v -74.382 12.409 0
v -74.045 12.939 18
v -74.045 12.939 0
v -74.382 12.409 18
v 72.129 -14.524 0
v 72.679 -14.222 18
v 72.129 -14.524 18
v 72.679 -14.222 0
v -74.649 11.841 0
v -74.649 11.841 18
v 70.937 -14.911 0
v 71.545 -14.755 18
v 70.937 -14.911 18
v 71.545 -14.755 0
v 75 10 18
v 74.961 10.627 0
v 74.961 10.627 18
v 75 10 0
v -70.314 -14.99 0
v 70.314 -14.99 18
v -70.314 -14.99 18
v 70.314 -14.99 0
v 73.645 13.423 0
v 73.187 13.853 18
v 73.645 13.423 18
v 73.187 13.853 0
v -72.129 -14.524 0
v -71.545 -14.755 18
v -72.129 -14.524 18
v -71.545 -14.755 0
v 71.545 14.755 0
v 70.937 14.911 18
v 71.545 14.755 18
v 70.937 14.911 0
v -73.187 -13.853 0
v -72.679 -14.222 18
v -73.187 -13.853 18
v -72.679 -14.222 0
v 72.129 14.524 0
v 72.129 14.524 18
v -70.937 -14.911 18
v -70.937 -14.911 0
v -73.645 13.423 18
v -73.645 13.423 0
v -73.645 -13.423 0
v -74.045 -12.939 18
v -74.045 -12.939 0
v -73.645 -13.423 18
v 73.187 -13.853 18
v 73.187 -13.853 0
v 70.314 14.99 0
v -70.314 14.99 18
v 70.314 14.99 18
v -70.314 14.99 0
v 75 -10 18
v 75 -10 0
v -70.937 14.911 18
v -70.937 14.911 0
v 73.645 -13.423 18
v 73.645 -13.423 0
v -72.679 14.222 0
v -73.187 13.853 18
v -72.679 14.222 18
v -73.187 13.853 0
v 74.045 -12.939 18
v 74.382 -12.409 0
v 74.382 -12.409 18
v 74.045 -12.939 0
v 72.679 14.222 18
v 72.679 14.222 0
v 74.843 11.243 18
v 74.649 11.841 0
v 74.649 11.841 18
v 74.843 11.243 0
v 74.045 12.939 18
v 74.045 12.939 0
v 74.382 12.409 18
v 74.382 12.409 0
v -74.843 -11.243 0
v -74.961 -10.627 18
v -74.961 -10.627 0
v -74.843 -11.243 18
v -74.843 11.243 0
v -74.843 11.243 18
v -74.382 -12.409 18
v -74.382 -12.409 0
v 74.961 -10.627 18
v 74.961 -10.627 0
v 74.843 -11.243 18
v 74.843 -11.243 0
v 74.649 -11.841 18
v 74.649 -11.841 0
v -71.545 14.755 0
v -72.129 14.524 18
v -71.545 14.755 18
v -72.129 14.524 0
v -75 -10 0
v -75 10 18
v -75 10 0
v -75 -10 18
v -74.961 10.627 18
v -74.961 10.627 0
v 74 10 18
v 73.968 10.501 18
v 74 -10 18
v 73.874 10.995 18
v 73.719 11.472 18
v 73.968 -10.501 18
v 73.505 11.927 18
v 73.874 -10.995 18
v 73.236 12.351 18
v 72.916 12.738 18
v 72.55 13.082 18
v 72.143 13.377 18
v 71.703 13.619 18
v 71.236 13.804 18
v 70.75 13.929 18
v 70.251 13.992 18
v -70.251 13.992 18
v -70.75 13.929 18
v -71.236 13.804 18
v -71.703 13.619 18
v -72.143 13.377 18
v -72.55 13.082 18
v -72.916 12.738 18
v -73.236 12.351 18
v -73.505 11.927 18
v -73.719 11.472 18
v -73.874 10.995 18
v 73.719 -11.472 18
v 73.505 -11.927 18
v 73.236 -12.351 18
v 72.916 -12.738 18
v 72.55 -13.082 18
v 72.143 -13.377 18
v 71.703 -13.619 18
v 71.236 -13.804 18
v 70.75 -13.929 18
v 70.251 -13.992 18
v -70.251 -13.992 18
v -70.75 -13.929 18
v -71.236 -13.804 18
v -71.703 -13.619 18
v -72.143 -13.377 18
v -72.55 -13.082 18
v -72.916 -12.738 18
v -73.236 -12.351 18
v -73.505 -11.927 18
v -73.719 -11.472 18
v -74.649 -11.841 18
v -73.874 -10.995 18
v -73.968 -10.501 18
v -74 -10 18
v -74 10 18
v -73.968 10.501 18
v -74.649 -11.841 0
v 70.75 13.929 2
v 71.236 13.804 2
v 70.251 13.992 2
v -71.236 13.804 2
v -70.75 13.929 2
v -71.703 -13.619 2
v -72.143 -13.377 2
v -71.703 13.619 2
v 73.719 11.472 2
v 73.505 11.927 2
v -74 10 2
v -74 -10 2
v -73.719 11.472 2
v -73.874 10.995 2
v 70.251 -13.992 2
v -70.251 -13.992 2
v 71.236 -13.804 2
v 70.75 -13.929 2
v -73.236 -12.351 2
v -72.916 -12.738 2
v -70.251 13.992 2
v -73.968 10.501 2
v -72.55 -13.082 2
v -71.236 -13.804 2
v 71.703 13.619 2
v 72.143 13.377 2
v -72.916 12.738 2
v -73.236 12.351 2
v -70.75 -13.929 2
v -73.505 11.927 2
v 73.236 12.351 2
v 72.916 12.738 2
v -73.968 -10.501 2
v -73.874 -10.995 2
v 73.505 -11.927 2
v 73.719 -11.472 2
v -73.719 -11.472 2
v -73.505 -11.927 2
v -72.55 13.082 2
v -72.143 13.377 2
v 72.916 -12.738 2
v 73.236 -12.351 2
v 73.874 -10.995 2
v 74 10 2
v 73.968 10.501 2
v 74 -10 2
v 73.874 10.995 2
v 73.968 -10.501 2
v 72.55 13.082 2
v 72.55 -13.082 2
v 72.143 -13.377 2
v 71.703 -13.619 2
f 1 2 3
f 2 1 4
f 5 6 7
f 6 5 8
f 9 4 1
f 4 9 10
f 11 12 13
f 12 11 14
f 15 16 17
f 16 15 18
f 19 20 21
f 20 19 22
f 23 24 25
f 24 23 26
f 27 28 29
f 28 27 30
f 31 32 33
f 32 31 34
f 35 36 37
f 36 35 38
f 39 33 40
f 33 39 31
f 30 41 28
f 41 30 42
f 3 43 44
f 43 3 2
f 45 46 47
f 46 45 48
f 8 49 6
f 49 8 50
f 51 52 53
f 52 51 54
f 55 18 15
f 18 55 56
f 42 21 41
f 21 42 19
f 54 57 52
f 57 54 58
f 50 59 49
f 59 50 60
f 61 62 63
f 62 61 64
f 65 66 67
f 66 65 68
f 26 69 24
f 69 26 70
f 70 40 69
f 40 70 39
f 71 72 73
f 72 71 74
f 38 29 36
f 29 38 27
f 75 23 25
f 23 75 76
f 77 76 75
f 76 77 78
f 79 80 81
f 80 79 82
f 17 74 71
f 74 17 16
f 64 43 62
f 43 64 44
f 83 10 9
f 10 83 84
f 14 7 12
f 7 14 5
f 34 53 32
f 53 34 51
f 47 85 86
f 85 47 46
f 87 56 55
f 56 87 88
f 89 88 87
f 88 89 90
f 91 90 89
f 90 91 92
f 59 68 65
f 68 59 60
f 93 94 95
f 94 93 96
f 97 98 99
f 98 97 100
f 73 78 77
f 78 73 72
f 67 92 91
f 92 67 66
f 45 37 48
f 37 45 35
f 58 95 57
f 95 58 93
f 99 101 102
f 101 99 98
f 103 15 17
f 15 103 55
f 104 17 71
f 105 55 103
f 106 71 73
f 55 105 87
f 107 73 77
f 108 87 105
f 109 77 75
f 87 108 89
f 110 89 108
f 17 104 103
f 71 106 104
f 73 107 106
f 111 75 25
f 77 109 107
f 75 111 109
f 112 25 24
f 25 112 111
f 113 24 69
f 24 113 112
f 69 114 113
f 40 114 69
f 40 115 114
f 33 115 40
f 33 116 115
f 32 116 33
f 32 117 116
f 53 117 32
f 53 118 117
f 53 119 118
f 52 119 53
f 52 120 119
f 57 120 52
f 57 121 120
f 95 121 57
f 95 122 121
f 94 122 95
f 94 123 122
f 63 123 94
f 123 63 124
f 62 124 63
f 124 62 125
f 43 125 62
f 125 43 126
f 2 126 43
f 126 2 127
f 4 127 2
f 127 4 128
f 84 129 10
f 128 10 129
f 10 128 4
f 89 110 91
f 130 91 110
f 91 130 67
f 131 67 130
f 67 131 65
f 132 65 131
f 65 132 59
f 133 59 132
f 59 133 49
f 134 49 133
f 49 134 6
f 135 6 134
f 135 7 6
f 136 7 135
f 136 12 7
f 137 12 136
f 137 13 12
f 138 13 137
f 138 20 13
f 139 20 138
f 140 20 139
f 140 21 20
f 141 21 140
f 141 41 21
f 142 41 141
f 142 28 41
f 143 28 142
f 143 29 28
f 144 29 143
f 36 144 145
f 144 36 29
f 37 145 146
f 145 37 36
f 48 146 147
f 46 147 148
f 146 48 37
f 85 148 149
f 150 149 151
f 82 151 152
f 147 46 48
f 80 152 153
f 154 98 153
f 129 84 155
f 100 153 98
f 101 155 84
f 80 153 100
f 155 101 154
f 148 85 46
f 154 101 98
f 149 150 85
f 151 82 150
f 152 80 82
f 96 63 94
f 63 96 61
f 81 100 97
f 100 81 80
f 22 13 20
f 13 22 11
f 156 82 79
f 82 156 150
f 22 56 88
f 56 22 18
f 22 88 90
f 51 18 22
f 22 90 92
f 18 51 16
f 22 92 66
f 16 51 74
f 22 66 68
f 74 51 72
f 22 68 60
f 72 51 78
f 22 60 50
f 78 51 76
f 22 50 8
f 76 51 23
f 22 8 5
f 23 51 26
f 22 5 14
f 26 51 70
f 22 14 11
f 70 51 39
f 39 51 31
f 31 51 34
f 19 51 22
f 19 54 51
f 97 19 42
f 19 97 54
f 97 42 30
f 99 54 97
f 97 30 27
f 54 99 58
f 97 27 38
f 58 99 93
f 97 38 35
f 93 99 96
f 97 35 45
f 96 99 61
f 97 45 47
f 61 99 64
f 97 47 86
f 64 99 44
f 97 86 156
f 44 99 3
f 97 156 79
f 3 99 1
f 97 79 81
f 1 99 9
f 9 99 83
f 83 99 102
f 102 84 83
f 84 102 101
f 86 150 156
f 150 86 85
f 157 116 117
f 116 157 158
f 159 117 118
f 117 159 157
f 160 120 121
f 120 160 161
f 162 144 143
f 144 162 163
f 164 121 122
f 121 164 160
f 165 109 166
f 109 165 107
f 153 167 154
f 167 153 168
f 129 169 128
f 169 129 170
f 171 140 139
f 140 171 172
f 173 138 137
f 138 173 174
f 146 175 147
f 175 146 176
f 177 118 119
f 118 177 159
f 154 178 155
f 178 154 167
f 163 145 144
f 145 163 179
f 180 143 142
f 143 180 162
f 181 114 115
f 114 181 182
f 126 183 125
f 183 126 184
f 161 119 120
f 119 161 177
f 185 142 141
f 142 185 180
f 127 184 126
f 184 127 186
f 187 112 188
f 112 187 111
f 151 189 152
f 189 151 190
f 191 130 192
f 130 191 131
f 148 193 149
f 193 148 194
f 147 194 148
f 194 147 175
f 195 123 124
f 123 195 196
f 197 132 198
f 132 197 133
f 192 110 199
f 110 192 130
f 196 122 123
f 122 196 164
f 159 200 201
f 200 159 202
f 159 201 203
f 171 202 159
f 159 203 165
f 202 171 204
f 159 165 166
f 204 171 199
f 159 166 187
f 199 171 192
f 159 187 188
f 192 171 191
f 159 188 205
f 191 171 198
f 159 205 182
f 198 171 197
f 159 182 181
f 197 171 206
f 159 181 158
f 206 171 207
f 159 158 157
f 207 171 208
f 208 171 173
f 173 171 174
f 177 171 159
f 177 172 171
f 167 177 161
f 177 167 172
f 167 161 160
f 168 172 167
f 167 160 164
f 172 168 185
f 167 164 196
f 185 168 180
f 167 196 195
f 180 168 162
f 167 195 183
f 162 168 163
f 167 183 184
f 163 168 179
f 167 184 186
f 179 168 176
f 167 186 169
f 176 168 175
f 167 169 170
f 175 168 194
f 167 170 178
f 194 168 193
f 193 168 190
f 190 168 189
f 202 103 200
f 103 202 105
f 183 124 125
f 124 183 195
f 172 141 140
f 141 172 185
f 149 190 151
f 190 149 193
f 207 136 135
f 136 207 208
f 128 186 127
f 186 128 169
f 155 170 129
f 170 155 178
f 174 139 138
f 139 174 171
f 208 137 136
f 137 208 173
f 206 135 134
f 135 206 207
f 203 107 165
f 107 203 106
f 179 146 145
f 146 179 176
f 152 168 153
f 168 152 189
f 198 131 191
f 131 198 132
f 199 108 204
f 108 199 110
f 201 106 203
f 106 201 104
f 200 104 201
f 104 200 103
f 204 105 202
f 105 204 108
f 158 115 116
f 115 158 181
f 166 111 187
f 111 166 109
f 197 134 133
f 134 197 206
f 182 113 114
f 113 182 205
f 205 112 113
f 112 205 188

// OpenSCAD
$fn = 50;


difference() {
	union() {
		hull() {
			translate(v = [-70.0000000000, 10.0000000000, 0]) {
				cylinder(h = 18, r = 5);
			}
			translate(v = [70.0000000000, 10.0000000000, 0]) {
				cylinder(h = 18, r = 5);
			}
			translate(v = [-70.0000000000, -10.0000000000, 0]) {
				cylinder(h = 18, r = 5);
			}
			translate(v = [70.0000000000, -10.0000000000, 0]) {
				cylinder(h = 18, r = 5);
			}
		}
	}
	union() {
		translate(v = [0, 0, 2]) {
			hull() {
				translate(v = [-70.0000000000, 10.0000000000, 0]) {
					cylinder(h = 16, r = 4);
				}
				translate(v = [70.0000000000, 10.0000000000, 0]) {
					cylinder(h = 16, r = 4);
				}
				translate(v = [-70.0000000000, -10.0000000000, 0]) {
					cylinder(h = 16, r = 4);
				}
				translate(v = [70.0000000000, -10.0000000000, 0]) {
					cylinder(h = 16, r = 4);
				}
			}
		}
	}
}
